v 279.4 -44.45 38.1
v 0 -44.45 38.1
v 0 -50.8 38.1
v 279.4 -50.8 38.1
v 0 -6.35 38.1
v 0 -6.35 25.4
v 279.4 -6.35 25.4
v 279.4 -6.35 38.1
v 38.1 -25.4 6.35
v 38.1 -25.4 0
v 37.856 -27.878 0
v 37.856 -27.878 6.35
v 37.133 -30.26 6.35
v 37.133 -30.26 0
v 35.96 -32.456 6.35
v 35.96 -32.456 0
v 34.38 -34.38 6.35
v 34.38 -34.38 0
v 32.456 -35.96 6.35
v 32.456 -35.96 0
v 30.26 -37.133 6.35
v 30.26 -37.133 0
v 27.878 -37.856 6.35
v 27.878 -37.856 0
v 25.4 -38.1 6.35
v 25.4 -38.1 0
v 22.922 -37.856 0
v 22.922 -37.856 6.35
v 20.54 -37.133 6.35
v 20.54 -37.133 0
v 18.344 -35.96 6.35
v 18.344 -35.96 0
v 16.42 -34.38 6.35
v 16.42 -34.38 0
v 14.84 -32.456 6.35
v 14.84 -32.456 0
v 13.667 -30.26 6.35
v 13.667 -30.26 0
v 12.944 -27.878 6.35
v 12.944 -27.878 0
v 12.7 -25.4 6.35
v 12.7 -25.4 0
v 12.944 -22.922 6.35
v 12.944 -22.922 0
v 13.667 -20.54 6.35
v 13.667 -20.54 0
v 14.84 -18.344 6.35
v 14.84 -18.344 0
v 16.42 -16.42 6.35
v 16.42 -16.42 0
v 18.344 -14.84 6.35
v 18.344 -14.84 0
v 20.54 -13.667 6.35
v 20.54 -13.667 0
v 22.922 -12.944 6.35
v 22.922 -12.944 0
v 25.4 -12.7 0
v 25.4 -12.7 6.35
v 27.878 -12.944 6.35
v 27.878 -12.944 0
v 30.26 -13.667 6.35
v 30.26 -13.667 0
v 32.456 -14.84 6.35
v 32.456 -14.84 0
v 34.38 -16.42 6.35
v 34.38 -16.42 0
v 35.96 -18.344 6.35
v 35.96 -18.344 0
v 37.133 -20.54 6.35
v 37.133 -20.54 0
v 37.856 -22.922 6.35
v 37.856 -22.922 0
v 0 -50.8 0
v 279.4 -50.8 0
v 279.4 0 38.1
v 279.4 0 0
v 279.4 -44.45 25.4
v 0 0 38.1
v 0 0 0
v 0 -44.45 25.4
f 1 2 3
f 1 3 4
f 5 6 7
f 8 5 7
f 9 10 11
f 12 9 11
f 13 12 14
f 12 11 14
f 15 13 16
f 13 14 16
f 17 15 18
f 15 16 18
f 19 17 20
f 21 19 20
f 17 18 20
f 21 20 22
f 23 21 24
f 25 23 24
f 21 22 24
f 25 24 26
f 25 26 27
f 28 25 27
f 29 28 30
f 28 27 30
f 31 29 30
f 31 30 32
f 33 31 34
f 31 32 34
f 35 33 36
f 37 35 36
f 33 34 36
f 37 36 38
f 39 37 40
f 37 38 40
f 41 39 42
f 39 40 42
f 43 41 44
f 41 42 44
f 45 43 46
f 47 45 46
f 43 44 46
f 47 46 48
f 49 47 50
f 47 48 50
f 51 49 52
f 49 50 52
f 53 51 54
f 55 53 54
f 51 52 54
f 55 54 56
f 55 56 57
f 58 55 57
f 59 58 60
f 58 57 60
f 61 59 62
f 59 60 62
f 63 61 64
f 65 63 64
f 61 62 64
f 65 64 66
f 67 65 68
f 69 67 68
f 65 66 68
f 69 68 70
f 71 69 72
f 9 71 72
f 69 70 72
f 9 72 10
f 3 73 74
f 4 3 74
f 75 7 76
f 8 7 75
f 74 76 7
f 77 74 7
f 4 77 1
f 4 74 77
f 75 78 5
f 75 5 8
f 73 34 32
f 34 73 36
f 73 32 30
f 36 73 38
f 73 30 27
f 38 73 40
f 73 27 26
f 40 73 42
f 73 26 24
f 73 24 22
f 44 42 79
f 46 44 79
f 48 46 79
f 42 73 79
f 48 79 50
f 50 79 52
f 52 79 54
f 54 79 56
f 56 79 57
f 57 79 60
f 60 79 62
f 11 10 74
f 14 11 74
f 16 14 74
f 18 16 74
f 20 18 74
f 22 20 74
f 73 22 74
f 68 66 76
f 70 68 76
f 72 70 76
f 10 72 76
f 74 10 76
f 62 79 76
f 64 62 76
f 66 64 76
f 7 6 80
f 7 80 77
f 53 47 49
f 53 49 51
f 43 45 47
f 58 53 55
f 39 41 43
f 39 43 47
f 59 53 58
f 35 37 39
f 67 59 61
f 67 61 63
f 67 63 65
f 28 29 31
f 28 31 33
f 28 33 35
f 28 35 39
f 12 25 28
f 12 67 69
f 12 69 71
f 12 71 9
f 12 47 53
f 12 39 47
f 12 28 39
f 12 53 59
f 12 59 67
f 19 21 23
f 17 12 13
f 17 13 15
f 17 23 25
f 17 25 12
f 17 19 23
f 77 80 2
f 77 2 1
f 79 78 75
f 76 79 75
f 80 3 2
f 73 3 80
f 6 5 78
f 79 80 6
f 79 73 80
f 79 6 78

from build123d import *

# Parameters (mm, degrees)
F0_W     = 685.8
F0_H     = 25.4
F1_DEPTH = 50.8
F2_W     = 685.8
F2_H     = 6.35
F3_DEPTH = 12.7
F4_R     = 12.7
F5_DEPTH = 6.35
F6_R     = 12.7
F7_DEPTH = 6.35
F8_W     = 406.4
F8_H     = 38.1
F9_DEPTH = 50.8


with BuildPart() as f1:
    # F0 (on Front) → F1 (new body)
    with BuildSketch(Plane.XZ):
        with Locations((342.9, 12.7)):
            Rectangle(F0_W, F0_H)
    extrude(amount=F1_DEPTH)

    # F2 (on face) → F3 (join)
    with BuildSketch(Plane.XY.offset(25.4)):
        with Locations((342.9, -47.625)):
            Rectangle(F2_W, F2_H)
        with Locations((342.9, -3.175)):
            Rectangle(F2_W, F2_H)
    extrude(amount=F3_DEPTH)

    # F4 (on face) → F5 (cut)
    with BuildSketch(Plane(origin=(0, 0, 0), x_dir=(1, 0, 0), z_dir=(0, 0, -1))):
        with Locations((342.9, 25.4)):
            Circle(F4_R)
    extrude(amount=-F5_DEPTH, mode=Mode.SUBTRACT)

    # F6 (on face) → F7 (cut)
    with BuildSketch(Plane(origin=(0, 0, 0), x_dir=(1, 0, 0), z_dir=(0, 0, -1))):
        with Locations((25.4, 25.4)):
            Circle(F6_R)
        with Locations((660.4, 25.4)):
            Circle(F6_R)
    extrude(amount=-F7_DEPTH, mode=Mode.SUBTRACT)

    # F8 (on face) → F9 (cut)
    with BuildSketch(Plane.XZ.offset(50.8)):
        with Locations((482.6, 19.05)):
            Rectangle(F8_W, F8_H)
    extrude(amount=-F9_DEPTH, mode=Mode.SUBTRACT)


solid = f1.part
